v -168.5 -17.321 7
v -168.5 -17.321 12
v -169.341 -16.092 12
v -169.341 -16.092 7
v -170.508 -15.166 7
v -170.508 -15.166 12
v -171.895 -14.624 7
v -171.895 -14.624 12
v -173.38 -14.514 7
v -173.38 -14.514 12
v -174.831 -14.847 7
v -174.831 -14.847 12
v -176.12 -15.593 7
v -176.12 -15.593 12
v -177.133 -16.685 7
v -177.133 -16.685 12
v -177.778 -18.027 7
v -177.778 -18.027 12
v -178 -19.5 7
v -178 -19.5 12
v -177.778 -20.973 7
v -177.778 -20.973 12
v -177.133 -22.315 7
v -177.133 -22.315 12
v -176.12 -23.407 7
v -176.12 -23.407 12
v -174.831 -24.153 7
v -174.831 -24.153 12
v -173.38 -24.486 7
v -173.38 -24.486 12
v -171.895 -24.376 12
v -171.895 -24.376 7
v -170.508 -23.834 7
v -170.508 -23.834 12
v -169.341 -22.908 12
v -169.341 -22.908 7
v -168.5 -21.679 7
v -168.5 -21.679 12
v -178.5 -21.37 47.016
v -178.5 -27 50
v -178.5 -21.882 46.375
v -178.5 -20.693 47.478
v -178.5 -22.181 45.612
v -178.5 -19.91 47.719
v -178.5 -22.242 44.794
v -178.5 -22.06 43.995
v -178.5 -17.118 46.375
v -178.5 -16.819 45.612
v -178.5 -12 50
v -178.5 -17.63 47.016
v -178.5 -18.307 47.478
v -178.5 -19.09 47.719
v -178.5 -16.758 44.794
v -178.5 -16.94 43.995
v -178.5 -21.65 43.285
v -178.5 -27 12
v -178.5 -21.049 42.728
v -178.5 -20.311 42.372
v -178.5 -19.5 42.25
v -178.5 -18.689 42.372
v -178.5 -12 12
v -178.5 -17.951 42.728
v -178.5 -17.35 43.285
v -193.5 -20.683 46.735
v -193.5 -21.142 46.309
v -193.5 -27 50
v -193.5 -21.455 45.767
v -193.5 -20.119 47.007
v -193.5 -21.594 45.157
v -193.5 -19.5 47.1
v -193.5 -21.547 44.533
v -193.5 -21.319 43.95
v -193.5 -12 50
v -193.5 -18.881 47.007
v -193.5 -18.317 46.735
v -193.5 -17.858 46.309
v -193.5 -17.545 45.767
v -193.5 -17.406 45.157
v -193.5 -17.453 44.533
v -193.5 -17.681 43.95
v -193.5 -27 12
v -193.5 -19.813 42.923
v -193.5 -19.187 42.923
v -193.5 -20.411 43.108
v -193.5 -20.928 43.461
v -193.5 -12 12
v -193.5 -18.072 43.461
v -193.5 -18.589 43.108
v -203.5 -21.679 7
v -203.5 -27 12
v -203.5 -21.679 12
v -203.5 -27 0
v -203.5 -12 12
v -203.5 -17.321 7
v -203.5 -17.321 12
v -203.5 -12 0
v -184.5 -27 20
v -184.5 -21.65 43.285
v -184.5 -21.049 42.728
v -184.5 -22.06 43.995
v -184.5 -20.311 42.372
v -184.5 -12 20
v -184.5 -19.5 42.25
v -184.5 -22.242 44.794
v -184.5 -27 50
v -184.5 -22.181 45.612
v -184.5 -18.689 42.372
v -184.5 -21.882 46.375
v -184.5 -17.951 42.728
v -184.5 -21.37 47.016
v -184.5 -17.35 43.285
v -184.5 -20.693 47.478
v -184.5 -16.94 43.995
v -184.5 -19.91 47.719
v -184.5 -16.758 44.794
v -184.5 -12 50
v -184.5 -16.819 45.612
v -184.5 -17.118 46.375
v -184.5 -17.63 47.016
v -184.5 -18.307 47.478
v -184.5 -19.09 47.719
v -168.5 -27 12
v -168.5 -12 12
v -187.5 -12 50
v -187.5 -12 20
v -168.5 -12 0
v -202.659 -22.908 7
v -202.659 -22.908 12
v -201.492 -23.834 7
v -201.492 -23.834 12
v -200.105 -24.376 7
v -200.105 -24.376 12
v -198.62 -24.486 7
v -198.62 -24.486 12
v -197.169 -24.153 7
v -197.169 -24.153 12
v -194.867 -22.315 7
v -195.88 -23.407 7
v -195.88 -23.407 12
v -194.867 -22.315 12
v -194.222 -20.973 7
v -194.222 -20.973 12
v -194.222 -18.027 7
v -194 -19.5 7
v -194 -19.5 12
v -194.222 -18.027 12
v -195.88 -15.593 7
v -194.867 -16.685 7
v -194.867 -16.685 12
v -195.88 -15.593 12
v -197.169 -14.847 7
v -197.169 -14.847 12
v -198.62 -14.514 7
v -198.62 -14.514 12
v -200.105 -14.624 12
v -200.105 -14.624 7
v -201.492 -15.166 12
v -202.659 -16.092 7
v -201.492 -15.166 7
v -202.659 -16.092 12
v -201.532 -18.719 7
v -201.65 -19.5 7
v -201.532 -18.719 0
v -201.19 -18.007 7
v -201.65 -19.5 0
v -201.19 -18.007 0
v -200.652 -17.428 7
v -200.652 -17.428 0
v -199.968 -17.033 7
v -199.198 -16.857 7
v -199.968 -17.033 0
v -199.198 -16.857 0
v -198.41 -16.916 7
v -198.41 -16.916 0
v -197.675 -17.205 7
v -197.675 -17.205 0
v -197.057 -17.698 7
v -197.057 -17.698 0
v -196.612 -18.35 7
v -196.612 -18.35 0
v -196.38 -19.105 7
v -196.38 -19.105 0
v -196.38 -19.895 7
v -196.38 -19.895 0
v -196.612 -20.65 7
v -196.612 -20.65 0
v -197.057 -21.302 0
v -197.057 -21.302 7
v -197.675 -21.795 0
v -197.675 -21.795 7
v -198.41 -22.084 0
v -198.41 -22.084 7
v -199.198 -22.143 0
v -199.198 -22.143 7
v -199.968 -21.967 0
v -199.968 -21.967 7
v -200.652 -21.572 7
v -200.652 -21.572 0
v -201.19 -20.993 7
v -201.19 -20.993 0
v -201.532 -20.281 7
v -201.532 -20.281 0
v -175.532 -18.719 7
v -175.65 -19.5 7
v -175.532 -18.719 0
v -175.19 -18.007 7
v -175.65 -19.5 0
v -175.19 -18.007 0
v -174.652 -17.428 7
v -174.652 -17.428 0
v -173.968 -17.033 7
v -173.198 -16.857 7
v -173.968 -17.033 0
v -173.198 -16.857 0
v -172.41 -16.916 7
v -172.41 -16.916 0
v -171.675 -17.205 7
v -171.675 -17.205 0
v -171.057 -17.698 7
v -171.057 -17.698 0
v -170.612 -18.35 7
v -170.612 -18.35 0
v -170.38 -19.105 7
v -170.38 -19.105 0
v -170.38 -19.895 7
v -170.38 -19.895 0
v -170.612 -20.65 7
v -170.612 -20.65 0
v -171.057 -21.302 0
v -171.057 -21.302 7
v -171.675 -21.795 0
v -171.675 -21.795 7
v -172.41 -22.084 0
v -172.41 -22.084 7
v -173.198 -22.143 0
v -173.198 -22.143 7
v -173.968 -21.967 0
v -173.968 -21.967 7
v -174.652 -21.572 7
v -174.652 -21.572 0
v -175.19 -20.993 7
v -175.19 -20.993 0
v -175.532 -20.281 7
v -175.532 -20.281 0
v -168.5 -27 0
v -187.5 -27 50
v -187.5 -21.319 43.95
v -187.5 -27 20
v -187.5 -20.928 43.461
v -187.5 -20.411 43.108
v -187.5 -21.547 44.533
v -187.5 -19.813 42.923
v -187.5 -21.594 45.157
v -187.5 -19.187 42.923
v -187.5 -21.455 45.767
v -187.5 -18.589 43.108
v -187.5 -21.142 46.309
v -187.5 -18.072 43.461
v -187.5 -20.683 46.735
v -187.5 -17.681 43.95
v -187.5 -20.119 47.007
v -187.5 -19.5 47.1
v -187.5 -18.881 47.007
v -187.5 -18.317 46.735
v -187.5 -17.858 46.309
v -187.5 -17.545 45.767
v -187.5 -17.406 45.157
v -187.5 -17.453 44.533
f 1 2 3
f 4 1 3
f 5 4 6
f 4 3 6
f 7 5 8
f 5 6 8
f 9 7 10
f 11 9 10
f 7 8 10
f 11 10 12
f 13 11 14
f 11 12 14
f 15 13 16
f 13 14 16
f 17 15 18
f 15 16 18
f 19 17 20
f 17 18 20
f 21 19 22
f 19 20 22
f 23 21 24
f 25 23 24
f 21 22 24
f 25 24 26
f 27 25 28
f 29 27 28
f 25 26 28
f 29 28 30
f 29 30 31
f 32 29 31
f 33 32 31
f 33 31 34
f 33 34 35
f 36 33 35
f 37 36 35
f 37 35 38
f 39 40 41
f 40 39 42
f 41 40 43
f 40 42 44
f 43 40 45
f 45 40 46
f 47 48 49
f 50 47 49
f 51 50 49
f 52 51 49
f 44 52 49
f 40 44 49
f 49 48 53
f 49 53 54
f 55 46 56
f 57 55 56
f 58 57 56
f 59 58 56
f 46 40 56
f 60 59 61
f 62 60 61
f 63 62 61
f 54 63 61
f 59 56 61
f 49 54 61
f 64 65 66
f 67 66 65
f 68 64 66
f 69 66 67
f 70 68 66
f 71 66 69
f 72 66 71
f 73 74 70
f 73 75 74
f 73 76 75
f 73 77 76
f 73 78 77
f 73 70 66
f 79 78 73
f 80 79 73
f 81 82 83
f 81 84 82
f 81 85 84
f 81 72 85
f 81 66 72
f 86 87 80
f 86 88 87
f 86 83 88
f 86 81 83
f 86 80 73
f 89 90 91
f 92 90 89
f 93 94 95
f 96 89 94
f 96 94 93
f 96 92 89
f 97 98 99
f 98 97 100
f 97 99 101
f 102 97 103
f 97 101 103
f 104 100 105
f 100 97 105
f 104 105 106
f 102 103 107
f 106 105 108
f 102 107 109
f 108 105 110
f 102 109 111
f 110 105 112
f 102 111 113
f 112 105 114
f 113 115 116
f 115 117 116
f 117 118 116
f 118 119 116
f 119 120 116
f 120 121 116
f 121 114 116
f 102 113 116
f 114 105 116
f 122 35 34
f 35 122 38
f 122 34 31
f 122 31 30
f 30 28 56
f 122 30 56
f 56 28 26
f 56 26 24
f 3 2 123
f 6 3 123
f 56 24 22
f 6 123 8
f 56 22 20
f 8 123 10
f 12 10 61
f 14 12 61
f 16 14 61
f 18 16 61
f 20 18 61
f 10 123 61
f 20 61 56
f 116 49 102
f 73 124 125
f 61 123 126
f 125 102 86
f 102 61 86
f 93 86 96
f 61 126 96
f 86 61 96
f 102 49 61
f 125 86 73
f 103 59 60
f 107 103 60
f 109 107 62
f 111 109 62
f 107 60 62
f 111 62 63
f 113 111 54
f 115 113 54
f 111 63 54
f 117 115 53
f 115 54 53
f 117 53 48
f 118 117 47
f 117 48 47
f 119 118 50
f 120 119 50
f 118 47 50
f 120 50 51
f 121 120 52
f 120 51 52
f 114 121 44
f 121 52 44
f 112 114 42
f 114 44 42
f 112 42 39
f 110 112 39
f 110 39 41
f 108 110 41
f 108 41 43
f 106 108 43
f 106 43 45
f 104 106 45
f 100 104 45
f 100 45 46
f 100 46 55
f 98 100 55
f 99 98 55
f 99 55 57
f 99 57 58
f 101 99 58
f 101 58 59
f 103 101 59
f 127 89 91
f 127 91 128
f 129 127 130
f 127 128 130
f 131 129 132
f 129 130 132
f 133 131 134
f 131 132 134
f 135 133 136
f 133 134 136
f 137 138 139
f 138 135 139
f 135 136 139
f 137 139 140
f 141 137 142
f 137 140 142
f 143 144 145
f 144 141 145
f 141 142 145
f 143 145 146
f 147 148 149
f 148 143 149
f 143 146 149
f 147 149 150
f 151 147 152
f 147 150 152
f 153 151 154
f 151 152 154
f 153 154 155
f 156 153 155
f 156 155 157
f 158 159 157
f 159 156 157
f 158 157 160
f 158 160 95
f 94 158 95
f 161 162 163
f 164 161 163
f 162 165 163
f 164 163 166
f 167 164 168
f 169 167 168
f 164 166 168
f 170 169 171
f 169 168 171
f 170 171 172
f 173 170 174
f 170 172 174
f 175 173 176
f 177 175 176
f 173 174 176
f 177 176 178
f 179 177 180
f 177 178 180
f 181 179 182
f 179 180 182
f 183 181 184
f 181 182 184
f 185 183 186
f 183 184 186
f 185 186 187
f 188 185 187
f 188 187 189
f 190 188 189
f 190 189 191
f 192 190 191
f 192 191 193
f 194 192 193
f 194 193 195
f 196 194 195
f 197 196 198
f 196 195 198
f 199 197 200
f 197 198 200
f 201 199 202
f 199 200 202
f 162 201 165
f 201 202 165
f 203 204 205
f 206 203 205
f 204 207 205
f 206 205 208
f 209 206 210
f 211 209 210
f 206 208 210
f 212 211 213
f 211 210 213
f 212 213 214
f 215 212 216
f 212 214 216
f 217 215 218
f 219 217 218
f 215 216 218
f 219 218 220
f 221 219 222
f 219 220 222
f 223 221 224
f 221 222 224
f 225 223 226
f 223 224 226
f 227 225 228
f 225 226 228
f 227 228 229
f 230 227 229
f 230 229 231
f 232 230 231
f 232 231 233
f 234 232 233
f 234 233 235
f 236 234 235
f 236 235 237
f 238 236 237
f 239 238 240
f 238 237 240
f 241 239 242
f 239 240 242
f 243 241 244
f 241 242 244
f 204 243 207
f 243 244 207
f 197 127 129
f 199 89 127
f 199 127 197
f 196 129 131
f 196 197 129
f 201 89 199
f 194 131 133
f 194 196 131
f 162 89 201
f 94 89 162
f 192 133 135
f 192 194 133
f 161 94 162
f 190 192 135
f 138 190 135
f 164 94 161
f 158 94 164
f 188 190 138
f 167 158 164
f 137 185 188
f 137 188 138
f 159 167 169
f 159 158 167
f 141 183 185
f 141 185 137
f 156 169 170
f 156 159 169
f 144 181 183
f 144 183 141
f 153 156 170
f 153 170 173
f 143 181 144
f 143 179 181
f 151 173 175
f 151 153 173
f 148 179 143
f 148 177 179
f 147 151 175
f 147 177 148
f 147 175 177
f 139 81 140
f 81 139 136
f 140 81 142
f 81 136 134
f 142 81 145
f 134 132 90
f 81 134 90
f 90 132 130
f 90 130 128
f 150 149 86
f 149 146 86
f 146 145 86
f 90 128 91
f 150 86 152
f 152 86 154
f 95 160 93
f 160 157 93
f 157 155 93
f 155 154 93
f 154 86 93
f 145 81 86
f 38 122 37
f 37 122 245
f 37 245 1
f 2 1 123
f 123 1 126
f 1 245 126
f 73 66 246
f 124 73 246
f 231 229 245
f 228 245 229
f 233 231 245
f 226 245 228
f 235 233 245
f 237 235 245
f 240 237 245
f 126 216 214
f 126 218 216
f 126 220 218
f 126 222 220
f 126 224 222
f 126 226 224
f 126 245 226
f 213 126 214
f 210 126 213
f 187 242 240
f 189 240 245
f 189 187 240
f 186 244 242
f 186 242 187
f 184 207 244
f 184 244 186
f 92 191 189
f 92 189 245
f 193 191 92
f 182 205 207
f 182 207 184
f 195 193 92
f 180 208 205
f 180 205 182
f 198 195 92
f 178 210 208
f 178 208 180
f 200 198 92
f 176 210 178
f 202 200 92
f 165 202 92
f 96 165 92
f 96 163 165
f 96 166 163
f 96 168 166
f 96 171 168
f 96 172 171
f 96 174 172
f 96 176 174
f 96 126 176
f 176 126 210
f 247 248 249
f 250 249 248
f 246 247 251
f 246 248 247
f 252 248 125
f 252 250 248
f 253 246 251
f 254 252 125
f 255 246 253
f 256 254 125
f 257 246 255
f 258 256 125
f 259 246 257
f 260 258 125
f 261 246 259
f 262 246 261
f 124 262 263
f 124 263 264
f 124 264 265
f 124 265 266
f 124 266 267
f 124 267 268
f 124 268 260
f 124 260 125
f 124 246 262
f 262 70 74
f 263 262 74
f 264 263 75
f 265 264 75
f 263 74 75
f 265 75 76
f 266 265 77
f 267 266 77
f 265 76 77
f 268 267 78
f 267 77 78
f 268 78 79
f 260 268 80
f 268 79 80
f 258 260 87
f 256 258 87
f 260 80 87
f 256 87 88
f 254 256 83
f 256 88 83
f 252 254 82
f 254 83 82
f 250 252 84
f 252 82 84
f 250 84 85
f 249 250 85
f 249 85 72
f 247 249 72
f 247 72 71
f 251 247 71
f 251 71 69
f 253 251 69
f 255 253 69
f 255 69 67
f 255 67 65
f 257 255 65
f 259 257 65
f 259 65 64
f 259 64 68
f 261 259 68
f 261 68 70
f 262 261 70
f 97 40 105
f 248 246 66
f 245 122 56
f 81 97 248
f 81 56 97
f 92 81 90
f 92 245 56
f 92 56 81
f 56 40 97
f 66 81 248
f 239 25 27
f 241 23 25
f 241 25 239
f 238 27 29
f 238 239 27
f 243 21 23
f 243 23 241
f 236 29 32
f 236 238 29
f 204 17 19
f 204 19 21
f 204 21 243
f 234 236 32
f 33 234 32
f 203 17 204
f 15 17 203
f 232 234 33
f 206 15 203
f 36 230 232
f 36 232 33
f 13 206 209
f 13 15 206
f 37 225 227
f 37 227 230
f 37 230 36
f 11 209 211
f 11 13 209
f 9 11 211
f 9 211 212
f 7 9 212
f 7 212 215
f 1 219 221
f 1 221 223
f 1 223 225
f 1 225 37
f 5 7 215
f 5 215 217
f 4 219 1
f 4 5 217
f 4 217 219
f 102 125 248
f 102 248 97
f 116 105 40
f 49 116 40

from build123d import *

# Parameters (mm, degrees)
SKETCH_1_W                   = 15
SKETCH_1_H                   = 15
EXTRUDE_1_DEPTH              = 50
SKETCH_2_W                   = 3
SKETCH_2_H                   = 15
CUT_EXTRUDE_1_DEPTH          = 30
SKETCH_3_W                   = 10
SKETCH_3_H                   = 15
EXTRUDE_2_DEPTH              = 12
HOLE_WIZARD_M5_2_D           = 5.3
HOLE_WIZARD_M5_2_CBORE_D     = 10
HOLE_WIZARD_M5_2_CBORE_DEPTH = 5
CUT_EXTRUDE_2_REACH          = 64.081
SKETCH_8_R                   = 2.75
M5X0_8_1_D                   = 4.2


with BuildPart() as part:
    # 草图1 → 凸台-拉伸1 (new body)
    with BuildSketch(Plane.XY):
        with Locations((-186, -19.5)):
            Rectangle(SKETCH_1_W, SKETCH_1_H)
    extrude(amount=EXTRUDE_1_DEPTH)

    # 草图2 → 切除-拉伸1 (cut)
    with BuildSketch(Plane.XY.offset(50)):
        with Locations((-186, -19.5)):
            Rectangle(SKETCH_2_W, SKETCH_2_H)
    extrude(amount=-CUT_EXTRUDE_1_DEPTH, mode=Mode.SUBTRACT)

    # 草图3 → 凸台-拉伸2 (add)
    with BuildSketch(Plane(origin=(0, 0, 0), x_dir=(-1, 0, 0), z_dir=(0, 0, -1))):
        with Locations((173.5, -19.5)):
            Rectangle(SKETCH_3_W, SKETCH_3_H)
        with Locations((198.5, -19.5)):
            Rectangle(SKETCH_3_W, SKETCH_3_H)
    extrude(amount=-EXTRUDE_2_DEPTH)

    # M5 凹头盖螺钉的柱形沉头孔2 (through all)
    with Locations(Plane.XY.offset(12)):
        with Locations((-199, -19.5), (-173, -19.5)):
            CounterBoreHole(HOLE_WIZARD_M5_2_D / 2, HOLE_WIZARD_M5_2_CBORE_D / 2, HOLE_WIZARD_M5_2_CBORE_DEPTH)

    # 草图8 → 切除-拉伸2 (cut, up to next)
    with BuildSketch(Plane(origin=(-178.5, 0, 0), x_dir=(0, 0, -1), z_dir=(1, 0, 0)), mode=Mode.PRIVATE) as cut_extrude_2_sk1:
        with Locations((-45, -19.5)):
            Circle(SKETCH_8_R)
    cut_extrude_2_tool1 = extrude(cut_extrude_2_sk1.sketch, amount=-CUT_EXTRUDE_2_REACH, mode=Mode.PRIVATE) & part.part
    add(cut_extrude_2_tool1.solids().sort_by_distance((-178.5, -19.5, 45))[0], mode=Mode.SUBTRACT)

    # M5x0.8 螺纹孔1 (through all)
    with Locations(Plane(origin=(-187.5, 0, 0), x_dir=(0, 0, -1), z_dir=(1, 0, 0))):
        with Locations((-45, -19.5)):
            Hole(M5X0_8_1_D / 2)


solid = part.part
